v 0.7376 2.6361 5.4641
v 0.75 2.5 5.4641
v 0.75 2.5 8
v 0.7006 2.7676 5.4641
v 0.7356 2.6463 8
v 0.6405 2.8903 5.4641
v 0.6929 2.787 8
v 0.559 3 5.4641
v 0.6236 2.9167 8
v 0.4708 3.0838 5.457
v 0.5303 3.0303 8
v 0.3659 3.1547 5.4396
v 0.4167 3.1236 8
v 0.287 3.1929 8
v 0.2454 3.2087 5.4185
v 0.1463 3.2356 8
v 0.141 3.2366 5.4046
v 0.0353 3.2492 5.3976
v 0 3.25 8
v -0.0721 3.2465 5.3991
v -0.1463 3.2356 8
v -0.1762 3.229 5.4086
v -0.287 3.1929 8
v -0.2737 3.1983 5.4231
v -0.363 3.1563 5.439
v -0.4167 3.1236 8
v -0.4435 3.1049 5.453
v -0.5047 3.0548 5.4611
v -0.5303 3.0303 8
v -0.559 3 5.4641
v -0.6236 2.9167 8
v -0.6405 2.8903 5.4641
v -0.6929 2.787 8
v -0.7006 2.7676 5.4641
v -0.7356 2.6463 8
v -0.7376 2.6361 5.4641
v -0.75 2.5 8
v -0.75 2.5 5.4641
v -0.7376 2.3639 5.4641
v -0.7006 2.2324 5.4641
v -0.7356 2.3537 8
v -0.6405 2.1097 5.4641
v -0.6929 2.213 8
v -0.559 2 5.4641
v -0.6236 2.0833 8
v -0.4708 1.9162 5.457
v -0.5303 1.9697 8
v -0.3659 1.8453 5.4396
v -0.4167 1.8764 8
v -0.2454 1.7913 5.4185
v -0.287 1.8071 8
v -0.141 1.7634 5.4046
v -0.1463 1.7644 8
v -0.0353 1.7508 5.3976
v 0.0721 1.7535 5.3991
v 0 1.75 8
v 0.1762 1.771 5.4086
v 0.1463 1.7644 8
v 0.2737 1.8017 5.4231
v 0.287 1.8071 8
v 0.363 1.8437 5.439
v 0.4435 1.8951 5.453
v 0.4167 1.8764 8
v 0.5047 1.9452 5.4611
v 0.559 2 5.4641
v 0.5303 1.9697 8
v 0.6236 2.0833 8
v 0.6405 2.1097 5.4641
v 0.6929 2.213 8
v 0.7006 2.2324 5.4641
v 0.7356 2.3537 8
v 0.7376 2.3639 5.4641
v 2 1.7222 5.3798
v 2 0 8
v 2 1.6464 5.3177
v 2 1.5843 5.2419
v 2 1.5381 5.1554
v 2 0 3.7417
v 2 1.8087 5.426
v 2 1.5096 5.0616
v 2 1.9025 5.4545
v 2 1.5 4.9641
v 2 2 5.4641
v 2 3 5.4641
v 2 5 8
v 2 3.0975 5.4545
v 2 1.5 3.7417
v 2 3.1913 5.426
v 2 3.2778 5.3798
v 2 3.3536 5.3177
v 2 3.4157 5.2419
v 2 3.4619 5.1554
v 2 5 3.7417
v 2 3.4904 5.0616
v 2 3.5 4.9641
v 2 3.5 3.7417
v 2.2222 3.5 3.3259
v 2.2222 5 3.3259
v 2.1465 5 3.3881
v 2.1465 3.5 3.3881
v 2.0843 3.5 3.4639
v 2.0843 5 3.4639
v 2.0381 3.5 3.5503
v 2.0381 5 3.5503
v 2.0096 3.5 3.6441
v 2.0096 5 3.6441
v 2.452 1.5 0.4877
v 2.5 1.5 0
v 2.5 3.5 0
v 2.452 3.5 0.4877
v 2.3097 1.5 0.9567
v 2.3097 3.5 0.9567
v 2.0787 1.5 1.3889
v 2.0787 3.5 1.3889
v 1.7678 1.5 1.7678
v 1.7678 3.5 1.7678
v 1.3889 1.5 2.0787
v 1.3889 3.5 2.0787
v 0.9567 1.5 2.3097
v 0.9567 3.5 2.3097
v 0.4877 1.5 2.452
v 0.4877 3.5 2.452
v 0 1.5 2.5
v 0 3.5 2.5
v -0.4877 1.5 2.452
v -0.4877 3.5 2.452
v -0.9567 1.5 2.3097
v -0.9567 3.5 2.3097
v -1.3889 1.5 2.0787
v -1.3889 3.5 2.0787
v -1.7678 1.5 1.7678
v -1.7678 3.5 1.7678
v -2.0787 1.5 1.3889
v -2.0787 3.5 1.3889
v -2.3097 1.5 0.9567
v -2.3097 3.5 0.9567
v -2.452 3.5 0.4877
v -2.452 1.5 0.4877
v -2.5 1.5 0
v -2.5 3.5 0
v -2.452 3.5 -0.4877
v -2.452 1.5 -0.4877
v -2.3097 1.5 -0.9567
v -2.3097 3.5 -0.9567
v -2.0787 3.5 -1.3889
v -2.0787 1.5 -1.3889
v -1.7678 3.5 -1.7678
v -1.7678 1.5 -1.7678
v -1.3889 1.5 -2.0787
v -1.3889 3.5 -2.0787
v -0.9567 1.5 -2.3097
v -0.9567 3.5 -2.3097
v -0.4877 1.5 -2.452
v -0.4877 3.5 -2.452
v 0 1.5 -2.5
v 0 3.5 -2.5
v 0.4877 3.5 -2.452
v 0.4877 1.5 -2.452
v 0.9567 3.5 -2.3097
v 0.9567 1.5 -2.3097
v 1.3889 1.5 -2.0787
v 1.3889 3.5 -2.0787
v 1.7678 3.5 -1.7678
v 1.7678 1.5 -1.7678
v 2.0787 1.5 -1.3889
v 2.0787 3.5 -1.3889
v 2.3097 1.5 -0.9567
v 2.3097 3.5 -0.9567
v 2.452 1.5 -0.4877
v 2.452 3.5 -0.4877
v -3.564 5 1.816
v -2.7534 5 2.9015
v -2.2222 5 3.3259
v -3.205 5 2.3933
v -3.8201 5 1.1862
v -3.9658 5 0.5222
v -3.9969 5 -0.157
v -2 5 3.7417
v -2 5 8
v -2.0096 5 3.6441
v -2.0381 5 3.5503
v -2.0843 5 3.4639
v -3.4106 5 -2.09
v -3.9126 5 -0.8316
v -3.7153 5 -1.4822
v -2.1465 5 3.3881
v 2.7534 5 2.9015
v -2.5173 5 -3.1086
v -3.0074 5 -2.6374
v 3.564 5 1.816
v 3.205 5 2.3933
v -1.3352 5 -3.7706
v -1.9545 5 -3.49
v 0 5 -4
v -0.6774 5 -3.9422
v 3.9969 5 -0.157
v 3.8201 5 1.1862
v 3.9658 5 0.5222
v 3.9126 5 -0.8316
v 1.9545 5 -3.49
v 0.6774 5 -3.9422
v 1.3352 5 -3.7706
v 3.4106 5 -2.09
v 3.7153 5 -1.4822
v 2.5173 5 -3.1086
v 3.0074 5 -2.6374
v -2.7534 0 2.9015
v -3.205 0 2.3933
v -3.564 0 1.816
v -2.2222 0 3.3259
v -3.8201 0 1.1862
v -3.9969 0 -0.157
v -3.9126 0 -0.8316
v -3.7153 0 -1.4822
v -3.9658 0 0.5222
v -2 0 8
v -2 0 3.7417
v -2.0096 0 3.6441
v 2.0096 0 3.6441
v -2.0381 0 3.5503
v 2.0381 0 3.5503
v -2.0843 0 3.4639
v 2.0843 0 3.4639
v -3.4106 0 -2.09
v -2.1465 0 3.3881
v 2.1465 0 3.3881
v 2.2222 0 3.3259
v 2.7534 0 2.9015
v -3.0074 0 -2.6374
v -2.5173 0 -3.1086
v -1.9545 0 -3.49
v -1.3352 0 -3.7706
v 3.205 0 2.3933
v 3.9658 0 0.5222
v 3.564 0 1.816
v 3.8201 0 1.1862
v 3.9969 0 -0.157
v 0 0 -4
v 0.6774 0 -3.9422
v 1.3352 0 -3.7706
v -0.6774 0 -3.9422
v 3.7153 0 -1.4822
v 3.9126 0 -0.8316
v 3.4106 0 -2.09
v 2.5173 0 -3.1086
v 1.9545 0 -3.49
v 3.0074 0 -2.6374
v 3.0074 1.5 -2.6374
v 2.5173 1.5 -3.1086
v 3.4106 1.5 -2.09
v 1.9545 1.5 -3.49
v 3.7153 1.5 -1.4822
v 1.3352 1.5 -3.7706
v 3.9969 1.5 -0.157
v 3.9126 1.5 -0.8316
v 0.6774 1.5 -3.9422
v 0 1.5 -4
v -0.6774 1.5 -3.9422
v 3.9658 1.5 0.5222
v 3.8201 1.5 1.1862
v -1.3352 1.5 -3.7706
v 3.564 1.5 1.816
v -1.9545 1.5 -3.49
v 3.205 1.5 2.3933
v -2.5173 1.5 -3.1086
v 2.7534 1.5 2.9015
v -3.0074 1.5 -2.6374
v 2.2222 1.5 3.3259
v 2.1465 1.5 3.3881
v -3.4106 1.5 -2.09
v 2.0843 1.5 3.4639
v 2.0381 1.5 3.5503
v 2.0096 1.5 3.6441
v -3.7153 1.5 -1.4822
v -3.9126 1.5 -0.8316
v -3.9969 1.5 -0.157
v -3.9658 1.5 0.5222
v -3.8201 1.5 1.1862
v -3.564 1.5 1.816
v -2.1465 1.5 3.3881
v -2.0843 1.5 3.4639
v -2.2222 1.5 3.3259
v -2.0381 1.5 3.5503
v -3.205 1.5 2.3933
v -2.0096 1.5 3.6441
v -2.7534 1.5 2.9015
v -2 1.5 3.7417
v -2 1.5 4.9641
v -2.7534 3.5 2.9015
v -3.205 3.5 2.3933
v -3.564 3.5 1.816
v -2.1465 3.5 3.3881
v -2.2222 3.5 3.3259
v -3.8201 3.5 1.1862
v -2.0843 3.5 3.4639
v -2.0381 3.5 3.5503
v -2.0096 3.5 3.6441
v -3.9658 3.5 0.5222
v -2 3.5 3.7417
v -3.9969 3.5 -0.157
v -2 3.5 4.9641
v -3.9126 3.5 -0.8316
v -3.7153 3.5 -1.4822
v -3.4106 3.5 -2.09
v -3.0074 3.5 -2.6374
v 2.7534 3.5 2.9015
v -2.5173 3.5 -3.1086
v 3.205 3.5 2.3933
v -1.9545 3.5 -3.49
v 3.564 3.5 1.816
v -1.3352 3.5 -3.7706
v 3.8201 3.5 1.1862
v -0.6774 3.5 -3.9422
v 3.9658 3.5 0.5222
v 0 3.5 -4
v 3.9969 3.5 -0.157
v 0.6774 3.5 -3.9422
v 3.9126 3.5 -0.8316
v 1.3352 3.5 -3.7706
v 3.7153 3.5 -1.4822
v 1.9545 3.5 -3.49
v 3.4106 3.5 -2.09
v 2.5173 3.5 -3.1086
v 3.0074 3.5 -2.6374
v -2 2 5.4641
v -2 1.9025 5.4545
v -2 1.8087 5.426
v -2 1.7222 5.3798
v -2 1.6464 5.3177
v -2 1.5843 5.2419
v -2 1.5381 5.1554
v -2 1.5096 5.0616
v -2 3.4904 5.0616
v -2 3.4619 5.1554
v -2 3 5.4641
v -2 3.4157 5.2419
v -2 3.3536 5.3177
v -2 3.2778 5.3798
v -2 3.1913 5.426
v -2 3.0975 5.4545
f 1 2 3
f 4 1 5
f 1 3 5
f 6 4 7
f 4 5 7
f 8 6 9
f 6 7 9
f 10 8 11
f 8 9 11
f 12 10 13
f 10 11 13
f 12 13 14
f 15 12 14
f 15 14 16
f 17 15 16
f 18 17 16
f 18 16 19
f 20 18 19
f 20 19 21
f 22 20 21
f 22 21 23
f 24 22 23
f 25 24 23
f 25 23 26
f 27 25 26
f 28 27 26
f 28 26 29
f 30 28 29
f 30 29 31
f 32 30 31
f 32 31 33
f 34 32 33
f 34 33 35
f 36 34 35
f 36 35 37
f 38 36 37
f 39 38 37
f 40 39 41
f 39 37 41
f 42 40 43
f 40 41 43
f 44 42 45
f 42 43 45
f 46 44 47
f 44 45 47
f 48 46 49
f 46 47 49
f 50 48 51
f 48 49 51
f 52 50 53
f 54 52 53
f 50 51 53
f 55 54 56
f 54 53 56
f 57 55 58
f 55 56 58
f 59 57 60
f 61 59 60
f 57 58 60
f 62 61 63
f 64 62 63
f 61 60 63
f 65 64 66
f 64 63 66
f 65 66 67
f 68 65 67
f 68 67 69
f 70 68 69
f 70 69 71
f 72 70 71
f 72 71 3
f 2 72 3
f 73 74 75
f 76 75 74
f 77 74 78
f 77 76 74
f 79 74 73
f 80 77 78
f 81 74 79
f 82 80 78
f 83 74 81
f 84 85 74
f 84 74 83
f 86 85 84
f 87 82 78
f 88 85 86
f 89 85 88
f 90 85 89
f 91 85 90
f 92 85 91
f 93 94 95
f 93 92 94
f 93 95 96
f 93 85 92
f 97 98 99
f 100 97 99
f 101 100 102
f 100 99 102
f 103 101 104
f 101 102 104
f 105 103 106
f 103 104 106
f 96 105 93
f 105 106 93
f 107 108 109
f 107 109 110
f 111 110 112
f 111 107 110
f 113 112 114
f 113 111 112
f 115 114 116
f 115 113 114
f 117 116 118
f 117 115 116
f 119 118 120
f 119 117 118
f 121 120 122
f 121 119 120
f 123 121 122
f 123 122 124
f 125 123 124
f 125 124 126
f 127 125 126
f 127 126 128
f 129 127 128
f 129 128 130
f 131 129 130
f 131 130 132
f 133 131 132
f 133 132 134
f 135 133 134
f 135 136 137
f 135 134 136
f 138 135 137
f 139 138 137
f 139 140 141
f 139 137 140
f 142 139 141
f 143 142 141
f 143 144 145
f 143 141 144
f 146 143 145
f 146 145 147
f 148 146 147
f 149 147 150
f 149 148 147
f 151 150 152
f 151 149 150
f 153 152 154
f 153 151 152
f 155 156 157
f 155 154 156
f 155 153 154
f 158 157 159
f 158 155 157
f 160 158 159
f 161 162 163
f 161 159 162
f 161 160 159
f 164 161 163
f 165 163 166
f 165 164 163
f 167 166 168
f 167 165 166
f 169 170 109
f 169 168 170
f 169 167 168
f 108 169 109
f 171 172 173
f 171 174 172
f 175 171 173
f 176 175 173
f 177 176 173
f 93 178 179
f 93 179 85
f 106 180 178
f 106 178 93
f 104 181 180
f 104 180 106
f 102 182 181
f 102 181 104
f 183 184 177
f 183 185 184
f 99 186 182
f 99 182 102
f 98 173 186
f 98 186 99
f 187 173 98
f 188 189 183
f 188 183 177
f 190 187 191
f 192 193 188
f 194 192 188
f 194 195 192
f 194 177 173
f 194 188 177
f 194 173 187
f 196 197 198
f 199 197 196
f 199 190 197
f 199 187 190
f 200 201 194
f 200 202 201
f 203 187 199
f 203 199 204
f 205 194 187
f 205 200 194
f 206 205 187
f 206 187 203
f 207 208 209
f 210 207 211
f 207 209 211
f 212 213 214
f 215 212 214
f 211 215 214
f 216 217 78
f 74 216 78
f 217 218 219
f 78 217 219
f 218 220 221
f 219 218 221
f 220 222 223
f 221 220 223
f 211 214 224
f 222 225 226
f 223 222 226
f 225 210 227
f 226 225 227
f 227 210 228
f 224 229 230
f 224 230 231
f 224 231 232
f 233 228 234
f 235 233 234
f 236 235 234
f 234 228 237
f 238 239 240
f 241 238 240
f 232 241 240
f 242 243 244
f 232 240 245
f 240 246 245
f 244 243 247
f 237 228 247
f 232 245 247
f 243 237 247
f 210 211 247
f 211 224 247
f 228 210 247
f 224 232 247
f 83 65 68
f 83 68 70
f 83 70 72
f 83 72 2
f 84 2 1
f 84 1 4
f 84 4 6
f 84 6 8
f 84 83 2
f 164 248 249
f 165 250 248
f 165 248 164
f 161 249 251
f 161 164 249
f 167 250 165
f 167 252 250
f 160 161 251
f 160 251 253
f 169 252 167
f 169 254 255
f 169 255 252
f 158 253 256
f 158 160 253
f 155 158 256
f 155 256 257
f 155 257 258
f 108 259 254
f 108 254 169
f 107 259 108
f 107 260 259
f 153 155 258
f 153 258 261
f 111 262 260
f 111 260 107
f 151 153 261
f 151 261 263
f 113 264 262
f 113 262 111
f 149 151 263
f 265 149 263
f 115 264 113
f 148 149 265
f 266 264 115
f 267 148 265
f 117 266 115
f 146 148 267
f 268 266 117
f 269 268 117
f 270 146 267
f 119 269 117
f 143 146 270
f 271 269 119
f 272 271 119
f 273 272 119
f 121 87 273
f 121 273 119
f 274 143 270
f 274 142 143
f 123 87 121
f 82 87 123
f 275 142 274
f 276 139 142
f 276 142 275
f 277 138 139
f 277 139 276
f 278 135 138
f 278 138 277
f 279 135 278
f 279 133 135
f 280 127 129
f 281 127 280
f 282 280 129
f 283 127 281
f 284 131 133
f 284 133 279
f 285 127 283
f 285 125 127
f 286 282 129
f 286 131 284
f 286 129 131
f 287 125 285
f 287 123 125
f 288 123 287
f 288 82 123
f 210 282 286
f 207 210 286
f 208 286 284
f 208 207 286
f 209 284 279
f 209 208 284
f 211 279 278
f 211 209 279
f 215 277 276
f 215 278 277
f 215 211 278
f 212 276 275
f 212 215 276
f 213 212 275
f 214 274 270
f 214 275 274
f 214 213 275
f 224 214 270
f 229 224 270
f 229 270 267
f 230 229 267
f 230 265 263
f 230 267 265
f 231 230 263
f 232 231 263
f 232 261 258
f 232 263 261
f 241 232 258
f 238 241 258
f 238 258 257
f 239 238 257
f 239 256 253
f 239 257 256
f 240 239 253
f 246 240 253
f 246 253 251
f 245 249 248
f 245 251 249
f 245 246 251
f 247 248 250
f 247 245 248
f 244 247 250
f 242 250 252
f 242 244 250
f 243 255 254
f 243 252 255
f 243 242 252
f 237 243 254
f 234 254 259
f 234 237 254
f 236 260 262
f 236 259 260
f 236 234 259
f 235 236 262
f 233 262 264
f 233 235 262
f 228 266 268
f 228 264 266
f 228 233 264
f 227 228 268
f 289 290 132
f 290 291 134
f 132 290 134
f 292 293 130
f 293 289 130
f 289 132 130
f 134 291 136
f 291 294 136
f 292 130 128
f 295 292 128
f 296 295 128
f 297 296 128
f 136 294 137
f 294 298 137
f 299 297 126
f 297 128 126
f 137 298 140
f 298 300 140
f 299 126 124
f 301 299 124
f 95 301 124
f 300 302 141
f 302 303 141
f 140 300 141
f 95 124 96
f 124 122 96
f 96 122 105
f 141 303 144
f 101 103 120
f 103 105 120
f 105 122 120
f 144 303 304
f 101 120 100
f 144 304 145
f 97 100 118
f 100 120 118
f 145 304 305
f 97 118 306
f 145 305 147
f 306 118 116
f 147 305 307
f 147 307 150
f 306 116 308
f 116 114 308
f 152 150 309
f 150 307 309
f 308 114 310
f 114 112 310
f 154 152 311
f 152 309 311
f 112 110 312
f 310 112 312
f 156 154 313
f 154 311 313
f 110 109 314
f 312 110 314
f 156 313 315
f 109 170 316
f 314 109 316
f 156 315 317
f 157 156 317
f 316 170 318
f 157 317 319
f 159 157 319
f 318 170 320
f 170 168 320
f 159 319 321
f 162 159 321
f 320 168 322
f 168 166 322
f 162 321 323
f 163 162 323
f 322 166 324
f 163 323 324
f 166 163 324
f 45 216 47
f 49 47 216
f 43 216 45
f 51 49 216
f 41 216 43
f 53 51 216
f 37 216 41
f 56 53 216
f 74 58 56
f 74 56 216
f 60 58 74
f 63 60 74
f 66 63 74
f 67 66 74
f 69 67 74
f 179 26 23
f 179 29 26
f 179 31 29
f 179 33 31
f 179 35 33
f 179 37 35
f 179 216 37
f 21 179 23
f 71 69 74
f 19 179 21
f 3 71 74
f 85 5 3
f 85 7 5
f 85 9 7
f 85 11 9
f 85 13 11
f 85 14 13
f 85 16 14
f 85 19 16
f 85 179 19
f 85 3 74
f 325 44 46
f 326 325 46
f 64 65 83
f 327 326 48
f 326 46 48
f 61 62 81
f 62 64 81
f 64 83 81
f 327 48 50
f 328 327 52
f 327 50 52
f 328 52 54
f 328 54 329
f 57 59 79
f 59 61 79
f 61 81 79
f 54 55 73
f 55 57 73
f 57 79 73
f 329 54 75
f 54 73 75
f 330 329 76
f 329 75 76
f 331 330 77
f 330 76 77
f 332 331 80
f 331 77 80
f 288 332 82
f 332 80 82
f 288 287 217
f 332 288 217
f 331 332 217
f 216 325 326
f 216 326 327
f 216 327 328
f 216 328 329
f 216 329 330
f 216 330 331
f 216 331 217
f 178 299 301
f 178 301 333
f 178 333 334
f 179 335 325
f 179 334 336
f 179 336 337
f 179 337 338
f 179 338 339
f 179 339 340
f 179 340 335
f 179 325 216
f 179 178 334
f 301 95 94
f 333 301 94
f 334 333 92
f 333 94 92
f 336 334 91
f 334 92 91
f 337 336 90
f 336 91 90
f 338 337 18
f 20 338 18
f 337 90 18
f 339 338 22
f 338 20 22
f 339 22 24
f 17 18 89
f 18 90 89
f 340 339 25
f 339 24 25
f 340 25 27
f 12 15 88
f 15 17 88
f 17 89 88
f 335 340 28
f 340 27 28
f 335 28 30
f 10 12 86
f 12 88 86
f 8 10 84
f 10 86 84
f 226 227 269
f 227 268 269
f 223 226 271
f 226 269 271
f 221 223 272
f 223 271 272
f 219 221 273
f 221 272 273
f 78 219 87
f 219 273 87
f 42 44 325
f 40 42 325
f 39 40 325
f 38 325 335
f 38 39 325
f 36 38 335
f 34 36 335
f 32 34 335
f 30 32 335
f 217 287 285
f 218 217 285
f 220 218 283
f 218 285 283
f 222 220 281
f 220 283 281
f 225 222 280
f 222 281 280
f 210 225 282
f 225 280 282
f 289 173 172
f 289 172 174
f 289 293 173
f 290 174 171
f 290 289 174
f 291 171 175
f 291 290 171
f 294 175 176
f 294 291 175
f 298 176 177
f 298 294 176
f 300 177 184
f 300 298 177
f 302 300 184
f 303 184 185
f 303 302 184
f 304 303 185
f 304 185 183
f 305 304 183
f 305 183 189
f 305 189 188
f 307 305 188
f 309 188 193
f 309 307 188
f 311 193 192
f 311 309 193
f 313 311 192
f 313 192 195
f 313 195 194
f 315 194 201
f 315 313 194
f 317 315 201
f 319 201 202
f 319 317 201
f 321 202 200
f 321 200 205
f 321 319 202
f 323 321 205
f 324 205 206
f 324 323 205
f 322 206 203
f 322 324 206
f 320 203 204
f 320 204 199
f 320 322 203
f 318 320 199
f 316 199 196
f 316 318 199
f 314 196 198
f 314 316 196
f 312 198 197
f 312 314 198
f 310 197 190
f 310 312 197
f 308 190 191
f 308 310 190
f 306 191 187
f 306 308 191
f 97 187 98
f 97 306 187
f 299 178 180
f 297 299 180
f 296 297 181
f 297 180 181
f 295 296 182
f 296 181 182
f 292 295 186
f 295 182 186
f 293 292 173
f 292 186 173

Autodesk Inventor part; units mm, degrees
ref_plane "YZ Plane" through (0, 0, 0) normal (1, 0, 0) x (0, 1, 0)
ref_plane "XZ Plane" through (0, 0, 0) normal (0, 1, 0) x (-1, 0, 0)
ref_plane "XY Plane" through (0, 0, 0) normal (0, 0, 1) x (1, 0, 0)
sketch "Sketch1" plane through (0, 0, 0) normal (0, 1, 0) x (-1, 0, 0)
  circle A0 centre (0, 0) radius 4
  dimension "d7" = 8
extrude "Extrusion1" add sketch "Sketch1" along normal blind 1.5
sketch "Sketch2" plane through (0, 1.5, 0) normal (0, 1, 0) x (1, 0, 0)
  circle A0 centre (0, 0) radius 2.5
  dimension "d10" = 5
extrude "Extrusion2" add sketch "Sketch2" along normal blind 2
sketch "Sketch3" plane through (0, 3.5, 0) normal (0, 1, 0) x (1, 0, 0)
  circle A0 centre (0, 0) radius 2.5 projected
  circle A1 centre (0, 0) radius 4 projected
extrude "Extrusion3" add sketch "Sketch3" along normal blind 1.5 contours A0 | A1
sketch "Sketch5" plane through (0, 5, 0) normal (0, 1, 0) x (1, 0, 0)
  circle A0 centre (0, 0) radius 2.5 projected
  circle A1 centre (0, 0) radius 4 projected
  circle A2 centre (0, 0) radius 4 projected
  line L0 (2, -3.4641) -> (-2, -3.4641)
  line L1 (-2, -3.4641) -> (-2, -8)
  line L2 (-2, -8) -> (2, -8)
  line L3 (2, -8) -> (2, -3.4641)
  dimension "d15" = 4
  dimension "d16" = 4
extrude "Extrusion4" add sketch "Sketch5" against normal blind 5 contours A1 L3 L2 L1
sketch "Sketch6" plane through (-2, 5, 8) normal (0, 0, 1) x (1, 0, 0)
  circle A0 centre (2, -2.5) radius 0.75
  line L0 (6, -1.5) -> (-2, -1.5) projected
  point P0 (2, -5)
  point P1 (4, -1.5)
  point P2 (0, -1.5)
  dimension "d21" = 1.5
  dimension "d27" = 1
extrude "Extrusion5" cut sketch "Sketch6" against normal blind 4.5
sketch "Sketch8" plane through (2, 5, 8) normal (1, 0, 0) x (0, 0, -1)
  line L0 (4.5359, -1.5) -> (4.5359, -3.5) projected
  line L1 (4.5359, -1.5) -> (4.5359, -3.5)
  line L2 (4.5359, -3.5) -> (2.5359, -3.5)
  line L3 (2.5359, -3.5) -> (2.5359, -1.5)
  line L4 (2.5359, -1.5) -> (4.5359, -1.5)
  point P0 (8, -5)
  dimension "d24" = 2
extrude "Extrusion6" cut sketch "Sketch8" against normal blind 4.5
fillet "Fillet1" radius 0.5 6 edges at (0, 3.5, 5.4641) (0, 1.5, 5.4641) (2, 4.25, 3.4641) (2, 0.75, 3.4641) (-2, 4.25, 3.4641) (-2, 0.75, 3.4641)
properties part number "Differential"
